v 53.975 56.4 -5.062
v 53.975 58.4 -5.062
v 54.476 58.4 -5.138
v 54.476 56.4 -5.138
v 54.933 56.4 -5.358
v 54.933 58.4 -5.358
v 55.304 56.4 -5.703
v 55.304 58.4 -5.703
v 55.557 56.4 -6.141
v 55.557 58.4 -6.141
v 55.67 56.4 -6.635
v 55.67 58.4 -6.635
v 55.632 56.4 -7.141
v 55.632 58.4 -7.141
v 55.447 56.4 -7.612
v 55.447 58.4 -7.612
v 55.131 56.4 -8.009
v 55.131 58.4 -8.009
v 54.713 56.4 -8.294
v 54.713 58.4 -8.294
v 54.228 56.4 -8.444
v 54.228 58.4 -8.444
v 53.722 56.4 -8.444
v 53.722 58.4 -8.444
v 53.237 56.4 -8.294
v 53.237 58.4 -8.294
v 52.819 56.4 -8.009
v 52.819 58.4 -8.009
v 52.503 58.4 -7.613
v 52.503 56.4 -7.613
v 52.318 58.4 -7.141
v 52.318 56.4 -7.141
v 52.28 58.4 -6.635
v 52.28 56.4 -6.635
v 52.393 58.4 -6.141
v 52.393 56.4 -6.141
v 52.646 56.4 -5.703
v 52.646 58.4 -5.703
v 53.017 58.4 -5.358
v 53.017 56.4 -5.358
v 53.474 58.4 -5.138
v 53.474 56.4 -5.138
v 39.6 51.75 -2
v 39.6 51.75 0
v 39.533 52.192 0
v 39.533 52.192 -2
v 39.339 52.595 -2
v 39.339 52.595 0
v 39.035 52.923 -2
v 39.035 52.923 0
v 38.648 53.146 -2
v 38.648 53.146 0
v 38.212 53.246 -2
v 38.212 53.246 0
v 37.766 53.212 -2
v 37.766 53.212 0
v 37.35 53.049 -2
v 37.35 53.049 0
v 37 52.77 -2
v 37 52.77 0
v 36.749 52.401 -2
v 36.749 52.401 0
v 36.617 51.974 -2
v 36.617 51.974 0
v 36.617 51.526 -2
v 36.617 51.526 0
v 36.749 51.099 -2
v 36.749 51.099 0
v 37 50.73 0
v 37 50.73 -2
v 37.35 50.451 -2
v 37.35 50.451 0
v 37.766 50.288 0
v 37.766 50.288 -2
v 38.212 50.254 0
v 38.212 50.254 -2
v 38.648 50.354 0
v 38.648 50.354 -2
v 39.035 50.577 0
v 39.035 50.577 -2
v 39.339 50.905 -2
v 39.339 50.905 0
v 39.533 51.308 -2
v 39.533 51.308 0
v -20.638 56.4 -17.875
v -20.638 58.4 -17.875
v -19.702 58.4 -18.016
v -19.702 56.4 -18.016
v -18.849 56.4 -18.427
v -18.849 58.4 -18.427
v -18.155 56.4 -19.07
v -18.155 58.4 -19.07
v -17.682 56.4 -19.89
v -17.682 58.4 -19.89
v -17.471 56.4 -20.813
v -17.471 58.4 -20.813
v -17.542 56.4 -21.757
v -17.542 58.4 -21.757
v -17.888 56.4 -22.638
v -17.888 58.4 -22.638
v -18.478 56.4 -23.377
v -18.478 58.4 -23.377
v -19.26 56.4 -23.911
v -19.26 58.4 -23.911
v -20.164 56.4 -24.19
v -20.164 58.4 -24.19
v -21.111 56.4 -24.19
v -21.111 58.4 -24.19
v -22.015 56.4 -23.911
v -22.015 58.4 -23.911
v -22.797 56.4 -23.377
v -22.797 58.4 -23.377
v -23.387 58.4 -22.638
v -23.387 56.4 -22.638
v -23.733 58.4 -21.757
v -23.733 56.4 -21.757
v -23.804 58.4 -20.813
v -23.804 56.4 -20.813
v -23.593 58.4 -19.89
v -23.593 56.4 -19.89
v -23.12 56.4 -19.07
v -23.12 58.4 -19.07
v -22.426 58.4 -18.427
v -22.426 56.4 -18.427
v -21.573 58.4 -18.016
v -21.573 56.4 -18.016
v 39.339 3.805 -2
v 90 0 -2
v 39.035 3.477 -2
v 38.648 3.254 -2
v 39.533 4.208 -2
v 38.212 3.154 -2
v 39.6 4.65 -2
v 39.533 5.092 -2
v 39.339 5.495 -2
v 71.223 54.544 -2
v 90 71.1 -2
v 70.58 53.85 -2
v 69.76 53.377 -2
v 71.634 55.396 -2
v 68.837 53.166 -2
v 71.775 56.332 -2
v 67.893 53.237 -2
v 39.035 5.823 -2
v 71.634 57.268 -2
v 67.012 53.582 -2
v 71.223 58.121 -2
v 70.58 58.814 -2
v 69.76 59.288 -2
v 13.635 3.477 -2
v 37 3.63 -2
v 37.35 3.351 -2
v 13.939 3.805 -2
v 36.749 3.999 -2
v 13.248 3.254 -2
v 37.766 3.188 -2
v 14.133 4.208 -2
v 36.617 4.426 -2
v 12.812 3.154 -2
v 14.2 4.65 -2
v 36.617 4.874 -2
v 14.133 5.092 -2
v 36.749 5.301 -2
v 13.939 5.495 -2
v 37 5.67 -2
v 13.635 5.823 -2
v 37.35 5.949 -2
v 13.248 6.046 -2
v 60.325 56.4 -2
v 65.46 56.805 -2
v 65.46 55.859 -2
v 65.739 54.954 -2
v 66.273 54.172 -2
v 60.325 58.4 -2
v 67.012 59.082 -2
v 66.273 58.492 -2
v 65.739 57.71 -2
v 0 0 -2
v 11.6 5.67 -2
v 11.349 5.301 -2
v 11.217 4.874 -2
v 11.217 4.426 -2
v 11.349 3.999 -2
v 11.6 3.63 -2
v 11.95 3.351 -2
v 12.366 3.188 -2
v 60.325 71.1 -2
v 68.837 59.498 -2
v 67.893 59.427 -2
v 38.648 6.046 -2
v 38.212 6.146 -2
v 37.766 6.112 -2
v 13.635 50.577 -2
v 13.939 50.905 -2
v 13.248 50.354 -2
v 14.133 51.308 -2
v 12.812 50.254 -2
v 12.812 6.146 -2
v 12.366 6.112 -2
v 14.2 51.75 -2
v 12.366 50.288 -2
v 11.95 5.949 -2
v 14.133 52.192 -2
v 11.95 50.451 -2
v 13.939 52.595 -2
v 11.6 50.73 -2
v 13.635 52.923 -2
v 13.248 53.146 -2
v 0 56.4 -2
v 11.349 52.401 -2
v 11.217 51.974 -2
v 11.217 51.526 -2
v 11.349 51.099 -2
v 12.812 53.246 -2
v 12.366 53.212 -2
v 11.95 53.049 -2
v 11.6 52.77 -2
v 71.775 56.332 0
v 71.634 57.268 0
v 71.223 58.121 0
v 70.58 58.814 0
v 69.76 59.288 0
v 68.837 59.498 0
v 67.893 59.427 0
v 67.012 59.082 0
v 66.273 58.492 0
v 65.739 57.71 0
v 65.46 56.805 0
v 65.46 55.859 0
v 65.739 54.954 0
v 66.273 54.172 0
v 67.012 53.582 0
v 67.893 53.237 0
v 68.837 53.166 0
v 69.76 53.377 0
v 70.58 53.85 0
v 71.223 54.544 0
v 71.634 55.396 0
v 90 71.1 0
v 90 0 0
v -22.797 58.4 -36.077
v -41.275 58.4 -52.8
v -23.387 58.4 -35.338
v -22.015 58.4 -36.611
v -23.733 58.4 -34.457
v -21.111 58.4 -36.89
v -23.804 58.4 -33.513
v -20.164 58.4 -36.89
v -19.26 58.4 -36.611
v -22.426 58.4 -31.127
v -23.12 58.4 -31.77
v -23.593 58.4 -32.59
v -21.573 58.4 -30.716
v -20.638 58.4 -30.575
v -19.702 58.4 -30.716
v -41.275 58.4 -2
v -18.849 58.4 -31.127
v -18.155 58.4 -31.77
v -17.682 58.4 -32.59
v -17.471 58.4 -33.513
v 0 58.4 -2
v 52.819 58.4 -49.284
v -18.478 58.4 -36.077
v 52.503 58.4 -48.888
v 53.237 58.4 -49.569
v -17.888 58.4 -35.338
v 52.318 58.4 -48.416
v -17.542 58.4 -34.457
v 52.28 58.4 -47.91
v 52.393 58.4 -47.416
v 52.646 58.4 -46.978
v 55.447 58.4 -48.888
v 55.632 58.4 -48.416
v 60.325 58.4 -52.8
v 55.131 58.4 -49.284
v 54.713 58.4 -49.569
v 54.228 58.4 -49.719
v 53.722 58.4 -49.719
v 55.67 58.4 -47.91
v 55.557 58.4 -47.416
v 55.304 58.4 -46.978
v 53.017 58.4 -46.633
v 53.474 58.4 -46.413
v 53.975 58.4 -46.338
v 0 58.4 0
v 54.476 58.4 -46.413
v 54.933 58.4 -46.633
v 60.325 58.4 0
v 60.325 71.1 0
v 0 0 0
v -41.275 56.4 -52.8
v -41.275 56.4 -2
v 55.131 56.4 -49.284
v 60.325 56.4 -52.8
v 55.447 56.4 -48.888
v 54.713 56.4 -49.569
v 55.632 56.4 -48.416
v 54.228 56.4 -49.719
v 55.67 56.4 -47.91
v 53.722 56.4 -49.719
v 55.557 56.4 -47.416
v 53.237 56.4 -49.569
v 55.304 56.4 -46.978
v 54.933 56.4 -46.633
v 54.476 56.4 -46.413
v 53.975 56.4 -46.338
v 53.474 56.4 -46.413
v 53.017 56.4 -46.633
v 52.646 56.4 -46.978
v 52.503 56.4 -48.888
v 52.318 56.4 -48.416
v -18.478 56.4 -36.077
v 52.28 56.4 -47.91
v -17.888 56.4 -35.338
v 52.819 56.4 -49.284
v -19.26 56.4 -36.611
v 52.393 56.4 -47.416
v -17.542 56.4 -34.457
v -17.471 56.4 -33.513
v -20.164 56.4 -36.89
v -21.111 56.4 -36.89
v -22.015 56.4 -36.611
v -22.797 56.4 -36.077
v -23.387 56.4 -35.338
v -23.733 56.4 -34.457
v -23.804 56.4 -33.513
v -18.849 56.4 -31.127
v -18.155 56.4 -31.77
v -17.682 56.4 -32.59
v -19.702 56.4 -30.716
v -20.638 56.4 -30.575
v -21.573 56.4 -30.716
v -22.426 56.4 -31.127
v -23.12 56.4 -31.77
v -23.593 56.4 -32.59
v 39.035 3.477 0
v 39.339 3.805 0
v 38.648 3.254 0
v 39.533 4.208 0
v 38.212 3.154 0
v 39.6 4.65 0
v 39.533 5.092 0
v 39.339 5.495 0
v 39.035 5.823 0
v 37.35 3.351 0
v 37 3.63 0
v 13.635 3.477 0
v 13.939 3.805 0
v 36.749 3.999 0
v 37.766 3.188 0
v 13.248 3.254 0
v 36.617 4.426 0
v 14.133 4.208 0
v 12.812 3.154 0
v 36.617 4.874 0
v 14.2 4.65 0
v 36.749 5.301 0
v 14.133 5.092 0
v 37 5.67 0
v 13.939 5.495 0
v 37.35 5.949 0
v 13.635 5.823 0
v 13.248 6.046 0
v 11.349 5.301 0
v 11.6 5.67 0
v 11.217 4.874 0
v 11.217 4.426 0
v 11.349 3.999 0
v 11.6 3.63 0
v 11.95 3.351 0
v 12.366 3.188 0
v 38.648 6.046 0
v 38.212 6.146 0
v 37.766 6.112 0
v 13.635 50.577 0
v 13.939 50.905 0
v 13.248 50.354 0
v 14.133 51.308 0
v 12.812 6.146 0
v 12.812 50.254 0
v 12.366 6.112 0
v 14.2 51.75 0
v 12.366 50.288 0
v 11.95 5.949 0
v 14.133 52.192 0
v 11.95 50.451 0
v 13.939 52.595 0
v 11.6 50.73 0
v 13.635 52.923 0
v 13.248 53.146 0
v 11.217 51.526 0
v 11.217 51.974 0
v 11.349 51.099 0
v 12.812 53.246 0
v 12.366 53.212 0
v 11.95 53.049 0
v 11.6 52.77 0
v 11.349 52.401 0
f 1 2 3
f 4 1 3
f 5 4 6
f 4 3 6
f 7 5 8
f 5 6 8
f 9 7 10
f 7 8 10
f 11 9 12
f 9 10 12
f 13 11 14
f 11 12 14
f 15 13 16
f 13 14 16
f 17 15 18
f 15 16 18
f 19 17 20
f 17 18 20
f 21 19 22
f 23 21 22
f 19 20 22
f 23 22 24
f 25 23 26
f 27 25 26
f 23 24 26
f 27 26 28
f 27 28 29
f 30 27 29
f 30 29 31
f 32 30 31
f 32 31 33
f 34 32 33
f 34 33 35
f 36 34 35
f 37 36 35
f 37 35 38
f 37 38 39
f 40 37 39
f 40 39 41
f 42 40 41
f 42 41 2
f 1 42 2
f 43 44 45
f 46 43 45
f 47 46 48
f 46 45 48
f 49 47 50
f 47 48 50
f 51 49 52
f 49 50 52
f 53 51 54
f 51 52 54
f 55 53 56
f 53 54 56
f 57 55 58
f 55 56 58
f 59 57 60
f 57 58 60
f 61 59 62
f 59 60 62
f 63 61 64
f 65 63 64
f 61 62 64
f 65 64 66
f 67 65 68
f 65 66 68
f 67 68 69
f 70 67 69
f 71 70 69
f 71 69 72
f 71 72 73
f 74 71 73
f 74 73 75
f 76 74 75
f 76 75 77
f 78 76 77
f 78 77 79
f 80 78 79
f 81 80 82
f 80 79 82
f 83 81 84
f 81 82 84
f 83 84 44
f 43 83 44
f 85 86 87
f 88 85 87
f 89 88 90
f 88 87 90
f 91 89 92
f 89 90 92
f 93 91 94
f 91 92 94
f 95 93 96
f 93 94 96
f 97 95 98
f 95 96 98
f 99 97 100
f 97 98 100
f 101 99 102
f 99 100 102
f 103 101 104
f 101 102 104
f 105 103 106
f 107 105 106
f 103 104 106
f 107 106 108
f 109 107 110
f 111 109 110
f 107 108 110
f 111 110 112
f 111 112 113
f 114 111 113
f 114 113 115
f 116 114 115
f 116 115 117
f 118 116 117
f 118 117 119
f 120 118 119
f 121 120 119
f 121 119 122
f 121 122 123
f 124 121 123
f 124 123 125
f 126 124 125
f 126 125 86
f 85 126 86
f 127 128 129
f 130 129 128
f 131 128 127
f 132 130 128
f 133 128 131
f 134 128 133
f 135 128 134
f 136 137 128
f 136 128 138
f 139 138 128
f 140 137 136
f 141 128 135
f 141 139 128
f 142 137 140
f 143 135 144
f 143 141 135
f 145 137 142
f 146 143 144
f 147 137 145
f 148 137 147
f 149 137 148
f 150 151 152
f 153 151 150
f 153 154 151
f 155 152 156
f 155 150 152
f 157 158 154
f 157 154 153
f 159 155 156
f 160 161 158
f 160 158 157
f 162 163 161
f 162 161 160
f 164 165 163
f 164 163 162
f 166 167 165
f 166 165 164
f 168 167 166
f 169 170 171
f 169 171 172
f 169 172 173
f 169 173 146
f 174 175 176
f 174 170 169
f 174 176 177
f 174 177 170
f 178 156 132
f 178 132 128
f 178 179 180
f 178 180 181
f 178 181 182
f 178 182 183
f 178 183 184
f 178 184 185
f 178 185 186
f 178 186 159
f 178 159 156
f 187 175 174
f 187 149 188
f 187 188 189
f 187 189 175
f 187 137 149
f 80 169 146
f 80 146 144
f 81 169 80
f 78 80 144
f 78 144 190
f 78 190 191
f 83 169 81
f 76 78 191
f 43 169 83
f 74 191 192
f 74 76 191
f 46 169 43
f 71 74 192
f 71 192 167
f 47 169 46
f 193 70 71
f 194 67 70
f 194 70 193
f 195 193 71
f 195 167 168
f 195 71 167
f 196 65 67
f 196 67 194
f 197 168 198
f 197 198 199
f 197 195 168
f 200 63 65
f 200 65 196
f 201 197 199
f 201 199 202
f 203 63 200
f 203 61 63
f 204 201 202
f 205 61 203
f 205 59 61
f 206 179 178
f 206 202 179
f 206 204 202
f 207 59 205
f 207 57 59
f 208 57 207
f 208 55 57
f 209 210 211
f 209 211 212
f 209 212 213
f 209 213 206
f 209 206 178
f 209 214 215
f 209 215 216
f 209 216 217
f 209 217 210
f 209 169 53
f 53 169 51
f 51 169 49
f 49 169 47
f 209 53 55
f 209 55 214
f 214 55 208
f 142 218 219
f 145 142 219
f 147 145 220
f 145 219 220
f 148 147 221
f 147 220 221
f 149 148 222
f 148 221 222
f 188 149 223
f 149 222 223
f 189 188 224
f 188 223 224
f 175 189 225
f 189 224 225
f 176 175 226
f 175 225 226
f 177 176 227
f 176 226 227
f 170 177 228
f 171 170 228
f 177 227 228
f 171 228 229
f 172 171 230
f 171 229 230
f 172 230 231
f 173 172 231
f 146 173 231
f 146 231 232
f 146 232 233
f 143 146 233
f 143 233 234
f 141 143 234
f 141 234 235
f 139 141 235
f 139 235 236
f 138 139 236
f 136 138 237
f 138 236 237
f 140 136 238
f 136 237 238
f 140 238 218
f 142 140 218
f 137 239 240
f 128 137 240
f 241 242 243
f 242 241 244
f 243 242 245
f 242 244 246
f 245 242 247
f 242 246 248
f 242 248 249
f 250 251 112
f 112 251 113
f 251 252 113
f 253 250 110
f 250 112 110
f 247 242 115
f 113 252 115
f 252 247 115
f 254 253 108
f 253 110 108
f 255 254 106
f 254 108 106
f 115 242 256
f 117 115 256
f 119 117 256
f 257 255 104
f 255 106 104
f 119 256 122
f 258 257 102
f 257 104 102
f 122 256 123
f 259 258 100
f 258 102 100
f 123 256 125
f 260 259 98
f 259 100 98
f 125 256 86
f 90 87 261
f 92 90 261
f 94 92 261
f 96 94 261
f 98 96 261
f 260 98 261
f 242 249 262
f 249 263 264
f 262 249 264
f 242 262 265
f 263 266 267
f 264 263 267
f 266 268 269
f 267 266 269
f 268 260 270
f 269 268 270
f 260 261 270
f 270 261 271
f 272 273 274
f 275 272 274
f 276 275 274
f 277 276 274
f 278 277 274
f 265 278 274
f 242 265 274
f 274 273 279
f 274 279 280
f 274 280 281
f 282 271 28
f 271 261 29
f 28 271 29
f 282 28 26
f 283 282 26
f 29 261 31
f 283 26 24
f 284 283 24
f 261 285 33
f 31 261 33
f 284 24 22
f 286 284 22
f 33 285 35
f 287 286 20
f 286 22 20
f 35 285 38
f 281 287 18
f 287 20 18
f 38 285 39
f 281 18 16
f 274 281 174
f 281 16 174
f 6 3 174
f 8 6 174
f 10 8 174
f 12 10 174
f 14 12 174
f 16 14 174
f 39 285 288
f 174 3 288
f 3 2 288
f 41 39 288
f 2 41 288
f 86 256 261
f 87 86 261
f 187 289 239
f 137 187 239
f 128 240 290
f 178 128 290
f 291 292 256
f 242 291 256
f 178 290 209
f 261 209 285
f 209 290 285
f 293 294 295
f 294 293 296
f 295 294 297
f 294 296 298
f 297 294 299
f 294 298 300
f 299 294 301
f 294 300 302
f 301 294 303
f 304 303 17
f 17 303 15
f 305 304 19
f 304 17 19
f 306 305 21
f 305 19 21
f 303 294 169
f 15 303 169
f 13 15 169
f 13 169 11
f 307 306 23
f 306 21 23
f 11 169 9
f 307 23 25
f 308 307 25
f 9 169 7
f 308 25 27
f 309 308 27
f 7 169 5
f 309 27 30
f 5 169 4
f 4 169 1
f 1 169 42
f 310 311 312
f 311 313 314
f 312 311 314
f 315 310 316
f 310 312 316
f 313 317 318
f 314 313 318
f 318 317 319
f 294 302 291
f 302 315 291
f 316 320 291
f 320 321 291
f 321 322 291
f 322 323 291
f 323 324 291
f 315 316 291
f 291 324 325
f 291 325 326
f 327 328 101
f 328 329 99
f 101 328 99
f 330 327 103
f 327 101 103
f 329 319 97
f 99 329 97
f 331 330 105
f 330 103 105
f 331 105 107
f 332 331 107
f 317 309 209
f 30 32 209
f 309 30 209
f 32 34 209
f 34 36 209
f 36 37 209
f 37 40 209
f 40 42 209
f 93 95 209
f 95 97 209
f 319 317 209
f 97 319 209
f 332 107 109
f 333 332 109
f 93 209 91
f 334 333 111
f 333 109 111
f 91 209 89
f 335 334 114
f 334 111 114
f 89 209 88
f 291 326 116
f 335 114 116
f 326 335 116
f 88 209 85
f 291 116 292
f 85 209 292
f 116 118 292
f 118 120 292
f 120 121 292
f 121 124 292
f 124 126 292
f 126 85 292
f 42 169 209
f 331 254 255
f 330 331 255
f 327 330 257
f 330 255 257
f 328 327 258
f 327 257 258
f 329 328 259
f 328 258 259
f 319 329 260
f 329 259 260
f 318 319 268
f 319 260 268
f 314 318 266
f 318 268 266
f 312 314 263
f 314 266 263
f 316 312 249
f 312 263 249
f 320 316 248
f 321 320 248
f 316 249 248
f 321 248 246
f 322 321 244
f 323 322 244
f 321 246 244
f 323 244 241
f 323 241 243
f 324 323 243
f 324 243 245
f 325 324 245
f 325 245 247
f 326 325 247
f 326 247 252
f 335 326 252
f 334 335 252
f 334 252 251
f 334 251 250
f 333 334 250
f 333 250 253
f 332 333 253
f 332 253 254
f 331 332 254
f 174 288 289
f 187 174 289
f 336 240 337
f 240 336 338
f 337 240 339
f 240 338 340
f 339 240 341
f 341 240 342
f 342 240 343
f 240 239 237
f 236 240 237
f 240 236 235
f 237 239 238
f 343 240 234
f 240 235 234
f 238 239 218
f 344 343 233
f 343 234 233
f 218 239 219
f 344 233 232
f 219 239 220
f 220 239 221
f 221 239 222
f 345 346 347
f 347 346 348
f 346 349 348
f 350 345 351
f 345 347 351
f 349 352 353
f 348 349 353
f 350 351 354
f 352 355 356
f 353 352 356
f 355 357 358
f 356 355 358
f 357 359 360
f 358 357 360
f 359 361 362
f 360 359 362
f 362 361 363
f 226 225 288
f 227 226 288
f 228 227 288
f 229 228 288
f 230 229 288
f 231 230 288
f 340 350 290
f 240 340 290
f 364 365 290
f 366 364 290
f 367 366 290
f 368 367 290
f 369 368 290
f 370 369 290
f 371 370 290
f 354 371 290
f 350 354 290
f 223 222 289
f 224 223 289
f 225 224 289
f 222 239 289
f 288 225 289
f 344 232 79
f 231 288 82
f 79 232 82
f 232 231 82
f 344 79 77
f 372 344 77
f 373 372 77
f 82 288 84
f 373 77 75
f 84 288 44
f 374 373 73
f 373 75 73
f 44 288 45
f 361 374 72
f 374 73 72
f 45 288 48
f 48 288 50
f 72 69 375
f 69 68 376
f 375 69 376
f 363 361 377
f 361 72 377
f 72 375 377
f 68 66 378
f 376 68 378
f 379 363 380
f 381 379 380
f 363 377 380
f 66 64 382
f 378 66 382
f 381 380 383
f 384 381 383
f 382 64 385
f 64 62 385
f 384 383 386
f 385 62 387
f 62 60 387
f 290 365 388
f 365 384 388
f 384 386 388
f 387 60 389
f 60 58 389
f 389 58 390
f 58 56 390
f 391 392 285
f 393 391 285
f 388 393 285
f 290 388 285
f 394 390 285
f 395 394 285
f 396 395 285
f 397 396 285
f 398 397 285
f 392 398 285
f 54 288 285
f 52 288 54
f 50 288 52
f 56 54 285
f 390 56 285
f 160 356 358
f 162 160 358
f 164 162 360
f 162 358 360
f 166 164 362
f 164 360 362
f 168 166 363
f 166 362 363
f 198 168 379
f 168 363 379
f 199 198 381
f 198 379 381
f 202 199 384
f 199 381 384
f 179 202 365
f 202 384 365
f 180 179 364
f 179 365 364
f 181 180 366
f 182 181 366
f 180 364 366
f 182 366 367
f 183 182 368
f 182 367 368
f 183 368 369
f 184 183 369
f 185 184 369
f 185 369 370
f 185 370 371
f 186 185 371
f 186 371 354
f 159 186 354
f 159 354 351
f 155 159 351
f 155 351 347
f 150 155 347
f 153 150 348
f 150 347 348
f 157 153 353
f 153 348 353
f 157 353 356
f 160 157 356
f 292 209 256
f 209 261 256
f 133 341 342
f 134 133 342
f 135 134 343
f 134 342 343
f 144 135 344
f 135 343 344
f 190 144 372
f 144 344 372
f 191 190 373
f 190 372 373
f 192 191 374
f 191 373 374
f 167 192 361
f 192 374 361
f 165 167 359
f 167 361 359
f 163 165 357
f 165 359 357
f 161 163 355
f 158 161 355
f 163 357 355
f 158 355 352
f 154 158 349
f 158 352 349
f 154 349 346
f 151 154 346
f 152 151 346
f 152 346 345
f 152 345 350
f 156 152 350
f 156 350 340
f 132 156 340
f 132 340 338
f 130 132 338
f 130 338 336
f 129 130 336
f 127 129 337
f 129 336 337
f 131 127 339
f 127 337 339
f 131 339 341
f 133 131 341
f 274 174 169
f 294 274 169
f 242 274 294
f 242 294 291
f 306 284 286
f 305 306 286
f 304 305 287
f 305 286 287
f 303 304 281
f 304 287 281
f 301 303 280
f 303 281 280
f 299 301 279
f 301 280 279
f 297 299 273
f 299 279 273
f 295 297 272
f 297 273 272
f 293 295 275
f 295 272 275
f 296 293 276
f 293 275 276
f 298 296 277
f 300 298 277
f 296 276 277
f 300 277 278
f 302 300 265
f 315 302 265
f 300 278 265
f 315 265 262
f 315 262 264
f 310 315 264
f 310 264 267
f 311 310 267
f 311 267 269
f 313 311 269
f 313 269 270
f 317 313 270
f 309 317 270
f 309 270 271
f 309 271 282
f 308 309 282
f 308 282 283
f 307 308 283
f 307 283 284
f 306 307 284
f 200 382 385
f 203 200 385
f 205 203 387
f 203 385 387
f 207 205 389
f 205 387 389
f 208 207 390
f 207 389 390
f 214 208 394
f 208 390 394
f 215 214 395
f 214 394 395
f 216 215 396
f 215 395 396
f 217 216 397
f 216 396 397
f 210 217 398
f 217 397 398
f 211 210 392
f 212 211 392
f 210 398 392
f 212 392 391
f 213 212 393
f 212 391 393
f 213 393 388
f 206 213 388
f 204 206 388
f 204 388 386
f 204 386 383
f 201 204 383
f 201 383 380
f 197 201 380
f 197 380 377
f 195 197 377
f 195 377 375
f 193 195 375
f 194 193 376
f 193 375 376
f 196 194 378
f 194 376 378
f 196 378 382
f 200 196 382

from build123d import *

# Parameters (mm, degrees)
SKETCH1_R           = 3.175
SKETCH1_R_2         = 1.5
BOSS_EXTRUDE1_DEPTH = 2
BOSS_EXTRUDE2_DEPTH = 50.8
SKETCH3_R           = 1.7
SKETCH3_R_2         = 3.175
CUT_EXTRUDE1_DEPTH  = 120.575917308


with BuildPart() as part:
    # Sketch1 → Boss-Extrude1 (new body)
    with BuildSketch(Plane.XY):
        Polygon((0, 58.4), (60.325, 58.4), (60.325, 71.1), (90, 71.1), (90, 0), (0, 0), align=None)
        with Locations((68.6, 56.33204182)):
            Circle(SKETCH1_R, mode=Mode.SUBTRACT)
        with Locations((12.7, 51.75)):
            Circle(SKETCH1_R_2, mode=Mode.SUBTRACT)
        with Locations((38.1, 51.75)):
            Circle(SKETCH1_R_2, mode=Mode.SUBTRACT)
        with Locations((12.7, 4.65)):
            Circle(SKETCH1_R_2, mode=Mode.SUBTRACT)
        with Locations((38.1, 4.65)):
            Circle(SKETCH1_R_2, mode=Mode.SUBTRACT)
    extrude(amount=-BOSS_EXTRUDE1_DEPTH)

    # Sketch2 → Boss-Extrude2 (add)
    with BuildSketch(Plane(origin=(0, 0, -2), x_dir=(-1, 0, 0), z_dir=(0, 0, -1))):
        Polygon((0, 56.4), (41.275, 56.4), (41.275, 58.4), (0, 58.4), (-60.325, 58.4), (-60.325, 56.4), align=None)
    extrude(amount=BOSS_EXTRUDE2_DEPTH)

    # Sketch3 → Cut-Extrude1 (cut, through all)
    with BuildSketch(Plane(origin=(0, 58.4, 0), x_dir=(1, 0, 0), z_dir=(0, 1, 0))):
        with Locations(Location((53.975, 48.0375, 0), (0, 0, 270))):
            Circle(SKETCH3_R)
        with Locations(Location((53.975, 6.7625, 0), (0, 0, 270))):
            Circle(SKETCH3_R)
        with Locations(Location((-20.6375, 33.75, 0), (0, 0, 270))):
            Circle(SKETCH3_R_2)
        with Locations(Location((-20.6375, 21.05, 0), (0, 0, 270))):
            Circle(SKETCH3_R_2)
    extrude(amount=-CUT_EXTRUDE1_DEPTH, mode=Mode.SUBTRACT)


solid = part.part
